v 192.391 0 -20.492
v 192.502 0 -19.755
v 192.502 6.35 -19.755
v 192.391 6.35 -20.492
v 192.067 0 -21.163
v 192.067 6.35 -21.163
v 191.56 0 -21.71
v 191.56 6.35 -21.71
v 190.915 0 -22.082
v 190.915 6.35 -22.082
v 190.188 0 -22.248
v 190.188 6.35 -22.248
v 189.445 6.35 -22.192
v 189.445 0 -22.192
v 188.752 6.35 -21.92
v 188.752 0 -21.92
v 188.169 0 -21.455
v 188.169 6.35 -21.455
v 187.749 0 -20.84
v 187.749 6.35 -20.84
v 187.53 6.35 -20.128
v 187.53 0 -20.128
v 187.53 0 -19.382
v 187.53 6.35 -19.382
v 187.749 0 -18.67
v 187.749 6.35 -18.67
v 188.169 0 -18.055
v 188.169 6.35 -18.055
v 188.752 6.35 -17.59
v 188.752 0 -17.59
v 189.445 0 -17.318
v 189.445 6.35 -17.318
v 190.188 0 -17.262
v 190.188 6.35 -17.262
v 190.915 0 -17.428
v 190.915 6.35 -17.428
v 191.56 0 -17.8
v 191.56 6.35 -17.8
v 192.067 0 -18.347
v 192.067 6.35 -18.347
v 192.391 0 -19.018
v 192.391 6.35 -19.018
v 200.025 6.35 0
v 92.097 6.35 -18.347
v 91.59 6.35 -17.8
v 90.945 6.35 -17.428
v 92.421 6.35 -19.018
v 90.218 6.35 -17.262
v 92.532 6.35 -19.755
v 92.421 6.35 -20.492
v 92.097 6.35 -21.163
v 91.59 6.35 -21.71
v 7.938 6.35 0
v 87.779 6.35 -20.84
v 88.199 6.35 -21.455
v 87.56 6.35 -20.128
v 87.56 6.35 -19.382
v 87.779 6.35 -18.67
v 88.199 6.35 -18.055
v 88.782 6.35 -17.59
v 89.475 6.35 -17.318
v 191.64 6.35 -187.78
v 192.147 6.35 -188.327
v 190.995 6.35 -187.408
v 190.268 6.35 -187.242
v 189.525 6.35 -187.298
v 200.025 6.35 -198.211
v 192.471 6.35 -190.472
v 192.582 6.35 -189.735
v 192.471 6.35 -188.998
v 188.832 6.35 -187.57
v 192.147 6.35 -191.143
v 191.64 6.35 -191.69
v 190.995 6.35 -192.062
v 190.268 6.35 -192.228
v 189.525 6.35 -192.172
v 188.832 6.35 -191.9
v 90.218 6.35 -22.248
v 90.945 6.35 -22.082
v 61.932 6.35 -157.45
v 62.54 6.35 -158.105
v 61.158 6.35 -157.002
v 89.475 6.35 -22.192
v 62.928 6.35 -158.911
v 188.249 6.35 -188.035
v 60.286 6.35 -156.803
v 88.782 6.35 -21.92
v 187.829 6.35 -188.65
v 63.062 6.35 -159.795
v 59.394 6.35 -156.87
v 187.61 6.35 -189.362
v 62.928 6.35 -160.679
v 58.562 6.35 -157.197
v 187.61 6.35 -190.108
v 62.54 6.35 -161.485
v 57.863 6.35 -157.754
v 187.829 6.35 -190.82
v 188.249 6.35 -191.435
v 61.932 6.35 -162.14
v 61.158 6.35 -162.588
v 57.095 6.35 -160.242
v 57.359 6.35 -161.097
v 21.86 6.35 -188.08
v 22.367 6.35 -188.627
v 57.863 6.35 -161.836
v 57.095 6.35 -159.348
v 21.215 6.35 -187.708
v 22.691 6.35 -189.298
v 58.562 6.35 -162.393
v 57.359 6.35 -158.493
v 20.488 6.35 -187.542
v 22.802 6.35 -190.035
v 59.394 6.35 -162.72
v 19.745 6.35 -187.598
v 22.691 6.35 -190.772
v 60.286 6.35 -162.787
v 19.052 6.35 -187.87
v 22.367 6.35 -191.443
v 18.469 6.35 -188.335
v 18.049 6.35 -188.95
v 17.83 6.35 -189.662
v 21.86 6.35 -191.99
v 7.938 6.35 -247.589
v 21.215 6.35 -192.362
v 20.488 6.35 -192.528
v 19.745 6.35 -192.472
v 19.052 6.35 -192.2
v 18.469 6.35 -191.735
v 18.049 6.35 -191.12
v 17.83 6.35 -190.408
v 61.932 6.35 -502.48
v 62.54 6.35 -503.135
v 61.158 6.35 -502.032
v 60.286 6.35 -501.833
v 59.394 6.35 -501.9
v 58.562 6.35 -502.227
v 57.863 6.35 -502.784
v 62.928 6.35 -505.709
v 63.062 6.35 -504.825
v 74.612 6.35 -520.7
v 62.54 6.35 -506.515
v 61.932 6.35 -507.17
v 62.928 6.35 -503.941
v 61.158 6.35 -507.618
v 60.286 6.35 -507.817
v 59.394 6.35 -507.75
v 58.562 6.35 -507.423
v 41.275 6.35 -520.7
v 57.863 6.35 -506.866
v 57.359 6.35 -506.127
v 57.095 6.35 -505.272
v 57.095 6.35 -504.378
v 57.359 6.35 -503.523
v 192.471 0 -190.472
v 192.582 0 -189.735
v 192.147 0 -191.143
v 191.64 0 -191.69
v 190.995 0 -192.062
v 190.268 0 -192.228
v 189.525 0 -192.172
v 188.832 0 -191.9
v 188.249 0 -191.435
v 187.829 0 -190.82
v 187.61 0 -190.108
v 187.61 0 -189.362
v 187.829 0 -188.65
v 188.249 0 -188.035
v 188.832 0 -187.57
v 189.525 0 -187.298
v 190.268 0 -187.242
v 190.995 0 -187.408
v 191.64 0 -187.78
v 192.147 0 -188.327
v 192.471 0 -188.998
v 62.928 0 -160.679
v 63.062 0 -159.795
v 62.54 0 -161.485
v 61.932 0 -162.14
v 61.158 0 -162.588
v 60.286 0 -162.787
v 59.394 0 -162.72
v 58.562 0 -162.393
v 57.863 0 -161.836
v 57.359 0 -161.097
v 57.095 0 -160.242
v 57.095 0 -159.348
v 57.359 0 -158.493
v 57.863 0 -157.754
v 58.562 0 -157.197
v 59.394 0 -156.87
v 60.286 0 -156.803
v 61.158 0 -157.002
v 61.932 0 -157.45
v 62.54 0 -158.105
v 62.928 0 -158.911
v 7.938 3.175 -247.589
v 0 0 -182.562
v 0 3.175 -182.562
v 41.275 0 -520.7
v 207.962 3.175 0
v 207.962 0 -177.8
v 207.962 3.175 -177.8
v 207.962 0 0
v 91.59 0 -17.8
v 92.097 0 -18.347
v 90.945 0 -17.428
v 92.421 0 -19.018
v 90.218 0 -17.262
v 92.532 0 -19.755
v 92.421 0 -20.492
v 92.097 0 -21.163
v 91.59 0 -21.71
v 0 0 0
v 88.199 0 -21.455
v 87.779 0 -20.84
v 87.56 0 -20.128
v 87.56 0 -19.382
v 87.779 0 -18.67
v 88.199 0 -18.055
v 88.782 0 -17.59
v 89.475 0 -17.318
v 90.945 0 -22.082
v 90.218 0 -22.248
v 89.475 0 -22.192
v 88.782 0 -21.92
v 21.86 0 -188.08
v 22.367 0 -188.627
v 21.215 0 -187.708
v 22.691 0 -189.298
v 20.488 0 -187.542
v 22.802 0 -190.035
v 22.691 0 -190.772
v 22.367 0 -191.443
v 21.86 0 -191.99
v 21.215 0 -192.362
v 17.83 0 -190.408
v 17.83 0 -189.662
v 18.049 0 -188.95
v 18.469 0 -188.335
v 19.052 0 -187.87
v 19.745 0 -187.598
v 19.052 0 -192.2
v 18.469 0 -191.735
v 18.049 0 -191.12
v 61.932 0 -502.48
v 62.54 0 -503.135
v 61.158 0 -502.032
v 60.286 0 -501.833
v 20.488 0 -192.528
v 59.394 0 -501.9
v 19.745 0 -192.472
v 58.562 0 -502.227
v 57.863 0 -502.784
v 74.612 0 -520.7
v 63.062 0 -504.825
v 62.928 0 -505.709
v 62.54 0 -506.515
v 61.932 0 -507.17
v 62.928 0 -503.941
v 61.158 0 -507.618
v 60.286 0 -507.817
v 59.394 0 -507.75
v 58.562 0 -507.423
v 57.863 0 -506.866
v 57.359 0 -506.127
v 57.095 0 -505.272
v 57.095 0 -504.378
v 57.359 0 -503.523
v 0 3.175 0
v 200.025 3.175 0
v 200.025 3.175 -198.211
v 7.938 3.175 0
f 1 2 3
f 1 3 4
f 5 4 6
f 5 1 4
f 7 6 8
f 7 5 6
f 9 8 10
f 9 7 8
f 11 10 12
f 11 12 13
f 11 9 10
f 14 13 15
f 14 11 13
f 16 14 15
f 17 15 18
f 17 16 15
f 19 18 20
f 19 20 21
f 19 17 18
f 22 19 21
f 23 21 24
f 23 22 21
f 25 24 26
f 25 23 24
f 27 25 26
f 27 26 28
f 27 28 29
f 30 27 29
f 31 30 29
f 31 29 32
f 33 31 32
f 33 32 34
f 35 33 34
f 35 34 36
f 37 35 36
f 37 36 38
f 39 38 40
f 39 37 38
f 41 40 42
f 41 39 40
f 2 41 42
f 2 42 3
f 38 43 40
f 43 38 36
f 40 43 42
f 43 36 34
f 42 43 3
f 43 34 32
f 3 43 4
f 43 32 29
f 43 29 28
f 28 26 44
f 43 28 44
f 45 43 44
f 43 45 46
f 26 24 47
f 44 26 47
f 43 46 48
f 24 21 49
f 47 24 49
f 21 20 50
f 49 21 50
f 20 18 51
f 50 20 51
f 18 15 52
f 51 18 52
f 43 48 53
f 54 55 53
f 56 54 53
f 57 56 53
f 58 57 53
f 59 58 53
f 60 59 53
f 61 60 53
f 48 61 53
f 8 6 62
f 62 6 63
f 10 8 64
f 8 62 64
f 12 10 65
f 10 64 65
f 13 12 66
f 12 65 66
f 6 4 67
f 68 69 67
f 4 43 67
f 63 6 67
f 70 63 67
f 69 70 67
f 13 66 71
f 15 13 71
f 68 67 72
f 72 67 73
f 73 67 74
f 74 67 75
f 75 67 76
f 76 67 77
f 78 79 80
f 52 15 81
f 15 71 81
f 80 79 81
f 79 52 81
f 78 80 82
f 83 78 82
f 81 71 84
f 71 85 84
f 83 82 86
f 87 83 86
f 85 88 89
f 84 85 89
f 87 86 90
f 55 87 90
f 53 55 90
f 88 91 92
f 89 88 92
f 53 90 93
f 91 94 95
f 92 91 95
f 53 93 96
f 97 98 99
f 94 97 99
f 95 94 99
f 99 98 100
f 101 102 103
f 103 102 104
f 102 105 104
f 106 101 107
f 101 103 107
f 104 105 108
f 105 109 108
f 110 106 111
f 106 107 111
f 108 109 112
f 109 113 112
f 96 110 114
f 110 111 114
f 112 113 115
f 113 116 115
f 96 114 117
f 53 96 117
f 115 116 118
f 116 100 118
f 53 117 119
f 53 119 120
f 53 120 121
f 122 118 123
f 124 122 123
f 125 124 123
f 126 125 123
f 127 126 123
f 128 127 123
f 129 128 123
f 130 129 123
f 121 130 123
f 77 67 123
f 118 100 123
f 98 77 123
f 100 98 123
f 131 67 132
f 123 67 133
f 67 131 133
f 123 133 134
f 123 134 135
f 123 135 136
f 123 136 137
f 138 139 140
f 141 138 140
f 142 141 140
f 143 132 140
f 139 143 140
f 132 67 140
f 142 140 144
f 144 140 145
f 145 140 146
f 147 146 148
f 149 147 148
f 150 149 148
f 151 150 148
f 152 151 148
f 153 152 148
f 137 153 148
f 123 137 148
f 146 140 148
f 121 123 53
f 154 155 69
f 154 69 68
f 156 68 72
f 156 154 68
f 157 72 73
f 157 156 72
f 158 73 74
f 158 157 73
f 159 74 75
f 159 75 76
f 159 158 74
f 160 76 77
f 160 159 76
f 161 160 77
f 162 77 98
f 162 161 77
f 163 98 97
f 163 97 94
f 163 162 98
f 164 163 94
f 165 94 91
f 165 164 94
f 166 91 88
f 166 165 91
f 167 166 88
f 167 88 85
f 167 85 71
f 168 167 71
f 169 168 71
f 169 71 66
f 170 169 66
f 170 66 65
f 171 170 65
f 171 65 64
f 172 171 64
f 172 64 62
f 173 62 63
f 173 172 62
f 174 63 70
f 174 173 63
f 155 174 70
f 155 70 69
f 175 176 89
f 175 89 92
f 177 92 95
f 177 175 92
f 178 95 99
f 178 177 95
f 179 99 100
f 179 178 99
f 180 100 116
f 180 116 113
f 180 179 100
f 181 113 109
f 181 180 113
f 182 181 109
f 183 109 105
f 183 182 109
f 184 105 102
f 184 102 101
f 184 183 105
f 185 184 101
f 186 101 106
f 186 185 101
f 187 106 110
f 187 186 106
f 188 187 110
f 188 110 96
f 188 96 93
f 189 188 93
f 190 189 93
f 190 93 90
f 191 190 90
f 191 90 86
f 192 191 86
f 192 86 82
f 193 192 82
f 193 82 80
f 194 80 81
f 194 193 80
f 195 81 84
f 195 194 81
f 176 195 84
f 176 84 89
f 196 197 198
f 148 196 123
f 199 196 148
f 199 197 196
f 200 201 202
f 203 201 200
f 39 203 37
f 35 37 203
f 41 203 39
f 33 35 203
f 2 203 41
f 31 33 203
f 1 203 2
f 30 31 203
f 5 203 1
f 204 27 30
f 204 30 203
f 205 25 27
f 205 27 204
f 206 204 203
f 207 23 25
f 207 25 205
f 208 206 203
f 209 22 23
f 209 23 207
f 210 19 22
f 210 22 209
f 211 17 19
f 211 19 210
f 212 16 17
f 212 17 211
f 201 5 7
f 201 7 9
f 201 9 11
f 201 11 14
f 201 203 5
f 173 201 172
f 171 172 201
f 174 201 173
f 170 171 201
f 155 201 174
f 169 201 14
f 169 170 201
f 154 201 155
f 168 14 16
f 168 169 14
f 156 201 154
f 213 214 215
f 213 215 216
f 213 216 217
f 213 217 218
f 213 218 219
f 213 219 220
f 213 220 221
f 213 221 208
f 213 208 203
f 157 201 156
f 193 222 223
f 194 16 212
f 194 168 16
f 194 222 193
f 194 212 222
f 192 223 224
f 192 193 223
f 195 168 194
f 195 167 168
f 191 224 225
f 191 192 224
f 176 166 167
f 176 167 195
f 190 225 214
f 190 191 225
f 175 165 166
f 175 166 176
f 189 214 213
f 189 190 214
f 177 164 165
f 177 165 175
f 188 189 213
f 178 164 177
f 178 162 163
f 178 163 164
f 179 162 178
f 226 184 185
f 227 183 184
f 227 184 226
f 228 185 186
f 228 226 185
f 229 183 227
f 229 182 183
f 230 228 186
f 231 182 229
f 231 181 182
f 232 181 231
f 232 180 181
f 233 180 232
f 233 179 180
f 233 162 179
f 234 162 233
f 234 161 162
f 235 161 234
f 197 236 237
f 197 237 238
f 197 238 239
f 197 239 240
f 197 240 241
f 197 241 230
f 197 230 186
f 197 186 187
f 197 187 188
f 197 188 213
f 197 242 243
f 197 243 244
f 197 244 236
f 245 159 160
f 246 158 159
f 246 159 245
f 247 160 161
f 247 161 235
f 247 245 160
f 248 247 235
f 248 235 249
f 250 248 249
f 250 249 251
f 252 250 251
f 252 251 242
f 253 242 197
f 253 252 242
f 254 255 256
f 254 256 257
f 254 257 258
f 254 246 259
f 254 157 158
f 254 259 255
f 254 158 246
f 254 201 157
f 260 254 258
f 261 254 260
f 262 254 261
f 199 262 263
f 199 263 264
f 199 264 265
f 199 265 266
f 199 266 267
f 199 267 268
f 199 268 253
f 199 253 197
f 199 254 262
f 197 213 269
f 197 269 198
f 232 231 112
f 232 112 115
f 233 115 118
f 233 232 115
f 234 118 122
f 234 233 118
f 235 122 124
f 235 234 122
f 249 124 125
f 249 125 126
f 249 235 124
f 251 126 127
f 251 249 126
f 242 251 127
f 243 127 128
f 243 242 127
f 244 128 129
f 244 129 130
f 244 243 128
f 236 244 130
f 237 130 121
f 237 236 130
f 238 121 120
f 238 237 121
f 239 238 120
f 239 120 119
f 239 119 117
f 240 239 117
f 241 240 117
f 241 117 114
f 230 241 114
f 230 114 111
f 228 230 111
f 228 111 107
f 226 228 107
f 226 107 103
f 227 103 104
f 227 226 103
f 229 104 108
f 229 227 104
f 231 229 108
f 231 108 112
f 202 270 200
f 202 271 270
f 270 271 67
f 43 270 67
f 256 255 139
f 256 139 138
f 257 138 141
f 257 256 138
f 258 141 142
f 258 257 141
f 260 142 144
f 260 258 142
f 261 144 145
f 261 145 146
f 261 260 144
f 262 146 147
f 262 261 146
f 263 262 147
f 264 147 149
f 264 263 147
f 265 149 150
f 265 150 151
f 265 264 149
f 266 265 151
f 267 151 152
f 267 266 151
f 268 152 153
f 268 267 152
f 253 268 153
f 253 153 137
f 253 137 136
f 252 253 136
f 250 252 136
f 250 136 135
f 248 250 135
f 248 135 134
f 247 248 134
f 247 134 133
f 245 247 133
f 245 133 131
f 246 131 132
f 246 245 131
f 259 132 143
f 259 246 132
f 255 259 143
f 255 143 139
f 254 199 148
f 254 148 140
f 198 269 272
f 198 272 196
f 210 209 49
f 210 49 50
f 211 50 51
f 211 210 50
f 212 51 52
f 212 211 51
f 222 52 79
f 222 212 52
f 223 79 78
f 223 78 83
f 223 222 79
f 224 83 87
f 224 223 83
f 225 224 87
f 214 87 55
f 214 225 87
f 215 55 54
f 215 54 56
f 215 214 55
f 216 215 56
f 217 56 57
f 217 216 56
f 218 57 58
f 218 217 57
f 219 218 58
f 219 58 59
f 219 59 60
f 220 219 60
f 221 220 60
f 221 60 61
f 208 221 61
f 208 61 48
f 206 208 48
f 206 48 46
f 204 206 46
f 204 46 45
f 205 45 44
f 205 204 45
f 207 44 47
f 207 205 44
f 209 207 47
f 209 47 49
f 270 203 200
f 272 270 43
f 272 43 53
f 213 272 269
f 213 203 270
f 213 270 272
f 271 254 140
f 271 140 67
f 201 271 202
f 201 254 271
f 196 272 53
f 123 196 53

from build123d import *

# Parameters (mm, degrees)
SKETCH2_R               = 3
SKETCH2_R_2             = 2.5
BOSS_EXTRUDE1_DEPTH     = 6.35
SKETCH3_W               = 7.9375
SKETCH3_H               = 3.175
CUT_EXTRUDE1_DEPTH      = 1
CUT_EXTRUDE1_DEPTH_BACK = 521.7


with BuildPart() as part:
    # Sketch2 → Boss-Extrude1 (new body)
    with BuildSketch(Plane(origin=(0, 0, 0), x_dir=(1, 0, 0), z_dir=(0, 1, 0))):
        Polygon((0, 0), (0, 182.5625), (41.275, 520.7), (74.6125, 520.7), (207.9625, 177.8), (207.9625, 0), align=None)
        with Locations((60.061658842, 504.825)):
            Circle(SKETCH2_R, mode=Mode.SUBTRACT)
        with Locations((20.301658842, 190.035)):
            Circle(SKETCH2_R_2, mode=Mode.SUBTRACT)
        with Locations((190.081658842, 189.735)):
            Circle(SKETCH2_R_2, mode=Mode.SUBTRACT)
        with Locations((190.001658842, 19.755)):
            Circle(SKETCH2_R_2, mode=Mode.SUBTRACT)
        with Locations((90.031658842, 19.755)):
            Circle(SKETCH2_R_2, mode=Mode.SUBTRACT)
        with Locations((60.061658842, 159.795)):
            Circle(SKETCH2_R, mode=Mode.SUBTRACT)
    extrude(amount=BOSS_EXTRUDE1_DEPTH)

    # Sketch3 → Cut-Extrude1 (cut, two sides)
    with BuildSketch(Plane.XY) as cut_extrude1_sk:
        with Locations((3.96875, 4.7625)):
            Rectangle(SKETCH3_W, SKETCH3_H)
        with Locations((203.99375, 4.7625)):
            Rectangle(SKETCH3_W, SKETCH3_H)
    extrude(amount=CUT_EXTRUDE1_DEPTH, mode=Mode.SUBTRACT)
    extrude(cut_extrude1_sk.sketch, amount=-CUT_EXTRUDE1_DEPTH_BACK, mode=Mode.SUBTRACT)


solid = part.part
